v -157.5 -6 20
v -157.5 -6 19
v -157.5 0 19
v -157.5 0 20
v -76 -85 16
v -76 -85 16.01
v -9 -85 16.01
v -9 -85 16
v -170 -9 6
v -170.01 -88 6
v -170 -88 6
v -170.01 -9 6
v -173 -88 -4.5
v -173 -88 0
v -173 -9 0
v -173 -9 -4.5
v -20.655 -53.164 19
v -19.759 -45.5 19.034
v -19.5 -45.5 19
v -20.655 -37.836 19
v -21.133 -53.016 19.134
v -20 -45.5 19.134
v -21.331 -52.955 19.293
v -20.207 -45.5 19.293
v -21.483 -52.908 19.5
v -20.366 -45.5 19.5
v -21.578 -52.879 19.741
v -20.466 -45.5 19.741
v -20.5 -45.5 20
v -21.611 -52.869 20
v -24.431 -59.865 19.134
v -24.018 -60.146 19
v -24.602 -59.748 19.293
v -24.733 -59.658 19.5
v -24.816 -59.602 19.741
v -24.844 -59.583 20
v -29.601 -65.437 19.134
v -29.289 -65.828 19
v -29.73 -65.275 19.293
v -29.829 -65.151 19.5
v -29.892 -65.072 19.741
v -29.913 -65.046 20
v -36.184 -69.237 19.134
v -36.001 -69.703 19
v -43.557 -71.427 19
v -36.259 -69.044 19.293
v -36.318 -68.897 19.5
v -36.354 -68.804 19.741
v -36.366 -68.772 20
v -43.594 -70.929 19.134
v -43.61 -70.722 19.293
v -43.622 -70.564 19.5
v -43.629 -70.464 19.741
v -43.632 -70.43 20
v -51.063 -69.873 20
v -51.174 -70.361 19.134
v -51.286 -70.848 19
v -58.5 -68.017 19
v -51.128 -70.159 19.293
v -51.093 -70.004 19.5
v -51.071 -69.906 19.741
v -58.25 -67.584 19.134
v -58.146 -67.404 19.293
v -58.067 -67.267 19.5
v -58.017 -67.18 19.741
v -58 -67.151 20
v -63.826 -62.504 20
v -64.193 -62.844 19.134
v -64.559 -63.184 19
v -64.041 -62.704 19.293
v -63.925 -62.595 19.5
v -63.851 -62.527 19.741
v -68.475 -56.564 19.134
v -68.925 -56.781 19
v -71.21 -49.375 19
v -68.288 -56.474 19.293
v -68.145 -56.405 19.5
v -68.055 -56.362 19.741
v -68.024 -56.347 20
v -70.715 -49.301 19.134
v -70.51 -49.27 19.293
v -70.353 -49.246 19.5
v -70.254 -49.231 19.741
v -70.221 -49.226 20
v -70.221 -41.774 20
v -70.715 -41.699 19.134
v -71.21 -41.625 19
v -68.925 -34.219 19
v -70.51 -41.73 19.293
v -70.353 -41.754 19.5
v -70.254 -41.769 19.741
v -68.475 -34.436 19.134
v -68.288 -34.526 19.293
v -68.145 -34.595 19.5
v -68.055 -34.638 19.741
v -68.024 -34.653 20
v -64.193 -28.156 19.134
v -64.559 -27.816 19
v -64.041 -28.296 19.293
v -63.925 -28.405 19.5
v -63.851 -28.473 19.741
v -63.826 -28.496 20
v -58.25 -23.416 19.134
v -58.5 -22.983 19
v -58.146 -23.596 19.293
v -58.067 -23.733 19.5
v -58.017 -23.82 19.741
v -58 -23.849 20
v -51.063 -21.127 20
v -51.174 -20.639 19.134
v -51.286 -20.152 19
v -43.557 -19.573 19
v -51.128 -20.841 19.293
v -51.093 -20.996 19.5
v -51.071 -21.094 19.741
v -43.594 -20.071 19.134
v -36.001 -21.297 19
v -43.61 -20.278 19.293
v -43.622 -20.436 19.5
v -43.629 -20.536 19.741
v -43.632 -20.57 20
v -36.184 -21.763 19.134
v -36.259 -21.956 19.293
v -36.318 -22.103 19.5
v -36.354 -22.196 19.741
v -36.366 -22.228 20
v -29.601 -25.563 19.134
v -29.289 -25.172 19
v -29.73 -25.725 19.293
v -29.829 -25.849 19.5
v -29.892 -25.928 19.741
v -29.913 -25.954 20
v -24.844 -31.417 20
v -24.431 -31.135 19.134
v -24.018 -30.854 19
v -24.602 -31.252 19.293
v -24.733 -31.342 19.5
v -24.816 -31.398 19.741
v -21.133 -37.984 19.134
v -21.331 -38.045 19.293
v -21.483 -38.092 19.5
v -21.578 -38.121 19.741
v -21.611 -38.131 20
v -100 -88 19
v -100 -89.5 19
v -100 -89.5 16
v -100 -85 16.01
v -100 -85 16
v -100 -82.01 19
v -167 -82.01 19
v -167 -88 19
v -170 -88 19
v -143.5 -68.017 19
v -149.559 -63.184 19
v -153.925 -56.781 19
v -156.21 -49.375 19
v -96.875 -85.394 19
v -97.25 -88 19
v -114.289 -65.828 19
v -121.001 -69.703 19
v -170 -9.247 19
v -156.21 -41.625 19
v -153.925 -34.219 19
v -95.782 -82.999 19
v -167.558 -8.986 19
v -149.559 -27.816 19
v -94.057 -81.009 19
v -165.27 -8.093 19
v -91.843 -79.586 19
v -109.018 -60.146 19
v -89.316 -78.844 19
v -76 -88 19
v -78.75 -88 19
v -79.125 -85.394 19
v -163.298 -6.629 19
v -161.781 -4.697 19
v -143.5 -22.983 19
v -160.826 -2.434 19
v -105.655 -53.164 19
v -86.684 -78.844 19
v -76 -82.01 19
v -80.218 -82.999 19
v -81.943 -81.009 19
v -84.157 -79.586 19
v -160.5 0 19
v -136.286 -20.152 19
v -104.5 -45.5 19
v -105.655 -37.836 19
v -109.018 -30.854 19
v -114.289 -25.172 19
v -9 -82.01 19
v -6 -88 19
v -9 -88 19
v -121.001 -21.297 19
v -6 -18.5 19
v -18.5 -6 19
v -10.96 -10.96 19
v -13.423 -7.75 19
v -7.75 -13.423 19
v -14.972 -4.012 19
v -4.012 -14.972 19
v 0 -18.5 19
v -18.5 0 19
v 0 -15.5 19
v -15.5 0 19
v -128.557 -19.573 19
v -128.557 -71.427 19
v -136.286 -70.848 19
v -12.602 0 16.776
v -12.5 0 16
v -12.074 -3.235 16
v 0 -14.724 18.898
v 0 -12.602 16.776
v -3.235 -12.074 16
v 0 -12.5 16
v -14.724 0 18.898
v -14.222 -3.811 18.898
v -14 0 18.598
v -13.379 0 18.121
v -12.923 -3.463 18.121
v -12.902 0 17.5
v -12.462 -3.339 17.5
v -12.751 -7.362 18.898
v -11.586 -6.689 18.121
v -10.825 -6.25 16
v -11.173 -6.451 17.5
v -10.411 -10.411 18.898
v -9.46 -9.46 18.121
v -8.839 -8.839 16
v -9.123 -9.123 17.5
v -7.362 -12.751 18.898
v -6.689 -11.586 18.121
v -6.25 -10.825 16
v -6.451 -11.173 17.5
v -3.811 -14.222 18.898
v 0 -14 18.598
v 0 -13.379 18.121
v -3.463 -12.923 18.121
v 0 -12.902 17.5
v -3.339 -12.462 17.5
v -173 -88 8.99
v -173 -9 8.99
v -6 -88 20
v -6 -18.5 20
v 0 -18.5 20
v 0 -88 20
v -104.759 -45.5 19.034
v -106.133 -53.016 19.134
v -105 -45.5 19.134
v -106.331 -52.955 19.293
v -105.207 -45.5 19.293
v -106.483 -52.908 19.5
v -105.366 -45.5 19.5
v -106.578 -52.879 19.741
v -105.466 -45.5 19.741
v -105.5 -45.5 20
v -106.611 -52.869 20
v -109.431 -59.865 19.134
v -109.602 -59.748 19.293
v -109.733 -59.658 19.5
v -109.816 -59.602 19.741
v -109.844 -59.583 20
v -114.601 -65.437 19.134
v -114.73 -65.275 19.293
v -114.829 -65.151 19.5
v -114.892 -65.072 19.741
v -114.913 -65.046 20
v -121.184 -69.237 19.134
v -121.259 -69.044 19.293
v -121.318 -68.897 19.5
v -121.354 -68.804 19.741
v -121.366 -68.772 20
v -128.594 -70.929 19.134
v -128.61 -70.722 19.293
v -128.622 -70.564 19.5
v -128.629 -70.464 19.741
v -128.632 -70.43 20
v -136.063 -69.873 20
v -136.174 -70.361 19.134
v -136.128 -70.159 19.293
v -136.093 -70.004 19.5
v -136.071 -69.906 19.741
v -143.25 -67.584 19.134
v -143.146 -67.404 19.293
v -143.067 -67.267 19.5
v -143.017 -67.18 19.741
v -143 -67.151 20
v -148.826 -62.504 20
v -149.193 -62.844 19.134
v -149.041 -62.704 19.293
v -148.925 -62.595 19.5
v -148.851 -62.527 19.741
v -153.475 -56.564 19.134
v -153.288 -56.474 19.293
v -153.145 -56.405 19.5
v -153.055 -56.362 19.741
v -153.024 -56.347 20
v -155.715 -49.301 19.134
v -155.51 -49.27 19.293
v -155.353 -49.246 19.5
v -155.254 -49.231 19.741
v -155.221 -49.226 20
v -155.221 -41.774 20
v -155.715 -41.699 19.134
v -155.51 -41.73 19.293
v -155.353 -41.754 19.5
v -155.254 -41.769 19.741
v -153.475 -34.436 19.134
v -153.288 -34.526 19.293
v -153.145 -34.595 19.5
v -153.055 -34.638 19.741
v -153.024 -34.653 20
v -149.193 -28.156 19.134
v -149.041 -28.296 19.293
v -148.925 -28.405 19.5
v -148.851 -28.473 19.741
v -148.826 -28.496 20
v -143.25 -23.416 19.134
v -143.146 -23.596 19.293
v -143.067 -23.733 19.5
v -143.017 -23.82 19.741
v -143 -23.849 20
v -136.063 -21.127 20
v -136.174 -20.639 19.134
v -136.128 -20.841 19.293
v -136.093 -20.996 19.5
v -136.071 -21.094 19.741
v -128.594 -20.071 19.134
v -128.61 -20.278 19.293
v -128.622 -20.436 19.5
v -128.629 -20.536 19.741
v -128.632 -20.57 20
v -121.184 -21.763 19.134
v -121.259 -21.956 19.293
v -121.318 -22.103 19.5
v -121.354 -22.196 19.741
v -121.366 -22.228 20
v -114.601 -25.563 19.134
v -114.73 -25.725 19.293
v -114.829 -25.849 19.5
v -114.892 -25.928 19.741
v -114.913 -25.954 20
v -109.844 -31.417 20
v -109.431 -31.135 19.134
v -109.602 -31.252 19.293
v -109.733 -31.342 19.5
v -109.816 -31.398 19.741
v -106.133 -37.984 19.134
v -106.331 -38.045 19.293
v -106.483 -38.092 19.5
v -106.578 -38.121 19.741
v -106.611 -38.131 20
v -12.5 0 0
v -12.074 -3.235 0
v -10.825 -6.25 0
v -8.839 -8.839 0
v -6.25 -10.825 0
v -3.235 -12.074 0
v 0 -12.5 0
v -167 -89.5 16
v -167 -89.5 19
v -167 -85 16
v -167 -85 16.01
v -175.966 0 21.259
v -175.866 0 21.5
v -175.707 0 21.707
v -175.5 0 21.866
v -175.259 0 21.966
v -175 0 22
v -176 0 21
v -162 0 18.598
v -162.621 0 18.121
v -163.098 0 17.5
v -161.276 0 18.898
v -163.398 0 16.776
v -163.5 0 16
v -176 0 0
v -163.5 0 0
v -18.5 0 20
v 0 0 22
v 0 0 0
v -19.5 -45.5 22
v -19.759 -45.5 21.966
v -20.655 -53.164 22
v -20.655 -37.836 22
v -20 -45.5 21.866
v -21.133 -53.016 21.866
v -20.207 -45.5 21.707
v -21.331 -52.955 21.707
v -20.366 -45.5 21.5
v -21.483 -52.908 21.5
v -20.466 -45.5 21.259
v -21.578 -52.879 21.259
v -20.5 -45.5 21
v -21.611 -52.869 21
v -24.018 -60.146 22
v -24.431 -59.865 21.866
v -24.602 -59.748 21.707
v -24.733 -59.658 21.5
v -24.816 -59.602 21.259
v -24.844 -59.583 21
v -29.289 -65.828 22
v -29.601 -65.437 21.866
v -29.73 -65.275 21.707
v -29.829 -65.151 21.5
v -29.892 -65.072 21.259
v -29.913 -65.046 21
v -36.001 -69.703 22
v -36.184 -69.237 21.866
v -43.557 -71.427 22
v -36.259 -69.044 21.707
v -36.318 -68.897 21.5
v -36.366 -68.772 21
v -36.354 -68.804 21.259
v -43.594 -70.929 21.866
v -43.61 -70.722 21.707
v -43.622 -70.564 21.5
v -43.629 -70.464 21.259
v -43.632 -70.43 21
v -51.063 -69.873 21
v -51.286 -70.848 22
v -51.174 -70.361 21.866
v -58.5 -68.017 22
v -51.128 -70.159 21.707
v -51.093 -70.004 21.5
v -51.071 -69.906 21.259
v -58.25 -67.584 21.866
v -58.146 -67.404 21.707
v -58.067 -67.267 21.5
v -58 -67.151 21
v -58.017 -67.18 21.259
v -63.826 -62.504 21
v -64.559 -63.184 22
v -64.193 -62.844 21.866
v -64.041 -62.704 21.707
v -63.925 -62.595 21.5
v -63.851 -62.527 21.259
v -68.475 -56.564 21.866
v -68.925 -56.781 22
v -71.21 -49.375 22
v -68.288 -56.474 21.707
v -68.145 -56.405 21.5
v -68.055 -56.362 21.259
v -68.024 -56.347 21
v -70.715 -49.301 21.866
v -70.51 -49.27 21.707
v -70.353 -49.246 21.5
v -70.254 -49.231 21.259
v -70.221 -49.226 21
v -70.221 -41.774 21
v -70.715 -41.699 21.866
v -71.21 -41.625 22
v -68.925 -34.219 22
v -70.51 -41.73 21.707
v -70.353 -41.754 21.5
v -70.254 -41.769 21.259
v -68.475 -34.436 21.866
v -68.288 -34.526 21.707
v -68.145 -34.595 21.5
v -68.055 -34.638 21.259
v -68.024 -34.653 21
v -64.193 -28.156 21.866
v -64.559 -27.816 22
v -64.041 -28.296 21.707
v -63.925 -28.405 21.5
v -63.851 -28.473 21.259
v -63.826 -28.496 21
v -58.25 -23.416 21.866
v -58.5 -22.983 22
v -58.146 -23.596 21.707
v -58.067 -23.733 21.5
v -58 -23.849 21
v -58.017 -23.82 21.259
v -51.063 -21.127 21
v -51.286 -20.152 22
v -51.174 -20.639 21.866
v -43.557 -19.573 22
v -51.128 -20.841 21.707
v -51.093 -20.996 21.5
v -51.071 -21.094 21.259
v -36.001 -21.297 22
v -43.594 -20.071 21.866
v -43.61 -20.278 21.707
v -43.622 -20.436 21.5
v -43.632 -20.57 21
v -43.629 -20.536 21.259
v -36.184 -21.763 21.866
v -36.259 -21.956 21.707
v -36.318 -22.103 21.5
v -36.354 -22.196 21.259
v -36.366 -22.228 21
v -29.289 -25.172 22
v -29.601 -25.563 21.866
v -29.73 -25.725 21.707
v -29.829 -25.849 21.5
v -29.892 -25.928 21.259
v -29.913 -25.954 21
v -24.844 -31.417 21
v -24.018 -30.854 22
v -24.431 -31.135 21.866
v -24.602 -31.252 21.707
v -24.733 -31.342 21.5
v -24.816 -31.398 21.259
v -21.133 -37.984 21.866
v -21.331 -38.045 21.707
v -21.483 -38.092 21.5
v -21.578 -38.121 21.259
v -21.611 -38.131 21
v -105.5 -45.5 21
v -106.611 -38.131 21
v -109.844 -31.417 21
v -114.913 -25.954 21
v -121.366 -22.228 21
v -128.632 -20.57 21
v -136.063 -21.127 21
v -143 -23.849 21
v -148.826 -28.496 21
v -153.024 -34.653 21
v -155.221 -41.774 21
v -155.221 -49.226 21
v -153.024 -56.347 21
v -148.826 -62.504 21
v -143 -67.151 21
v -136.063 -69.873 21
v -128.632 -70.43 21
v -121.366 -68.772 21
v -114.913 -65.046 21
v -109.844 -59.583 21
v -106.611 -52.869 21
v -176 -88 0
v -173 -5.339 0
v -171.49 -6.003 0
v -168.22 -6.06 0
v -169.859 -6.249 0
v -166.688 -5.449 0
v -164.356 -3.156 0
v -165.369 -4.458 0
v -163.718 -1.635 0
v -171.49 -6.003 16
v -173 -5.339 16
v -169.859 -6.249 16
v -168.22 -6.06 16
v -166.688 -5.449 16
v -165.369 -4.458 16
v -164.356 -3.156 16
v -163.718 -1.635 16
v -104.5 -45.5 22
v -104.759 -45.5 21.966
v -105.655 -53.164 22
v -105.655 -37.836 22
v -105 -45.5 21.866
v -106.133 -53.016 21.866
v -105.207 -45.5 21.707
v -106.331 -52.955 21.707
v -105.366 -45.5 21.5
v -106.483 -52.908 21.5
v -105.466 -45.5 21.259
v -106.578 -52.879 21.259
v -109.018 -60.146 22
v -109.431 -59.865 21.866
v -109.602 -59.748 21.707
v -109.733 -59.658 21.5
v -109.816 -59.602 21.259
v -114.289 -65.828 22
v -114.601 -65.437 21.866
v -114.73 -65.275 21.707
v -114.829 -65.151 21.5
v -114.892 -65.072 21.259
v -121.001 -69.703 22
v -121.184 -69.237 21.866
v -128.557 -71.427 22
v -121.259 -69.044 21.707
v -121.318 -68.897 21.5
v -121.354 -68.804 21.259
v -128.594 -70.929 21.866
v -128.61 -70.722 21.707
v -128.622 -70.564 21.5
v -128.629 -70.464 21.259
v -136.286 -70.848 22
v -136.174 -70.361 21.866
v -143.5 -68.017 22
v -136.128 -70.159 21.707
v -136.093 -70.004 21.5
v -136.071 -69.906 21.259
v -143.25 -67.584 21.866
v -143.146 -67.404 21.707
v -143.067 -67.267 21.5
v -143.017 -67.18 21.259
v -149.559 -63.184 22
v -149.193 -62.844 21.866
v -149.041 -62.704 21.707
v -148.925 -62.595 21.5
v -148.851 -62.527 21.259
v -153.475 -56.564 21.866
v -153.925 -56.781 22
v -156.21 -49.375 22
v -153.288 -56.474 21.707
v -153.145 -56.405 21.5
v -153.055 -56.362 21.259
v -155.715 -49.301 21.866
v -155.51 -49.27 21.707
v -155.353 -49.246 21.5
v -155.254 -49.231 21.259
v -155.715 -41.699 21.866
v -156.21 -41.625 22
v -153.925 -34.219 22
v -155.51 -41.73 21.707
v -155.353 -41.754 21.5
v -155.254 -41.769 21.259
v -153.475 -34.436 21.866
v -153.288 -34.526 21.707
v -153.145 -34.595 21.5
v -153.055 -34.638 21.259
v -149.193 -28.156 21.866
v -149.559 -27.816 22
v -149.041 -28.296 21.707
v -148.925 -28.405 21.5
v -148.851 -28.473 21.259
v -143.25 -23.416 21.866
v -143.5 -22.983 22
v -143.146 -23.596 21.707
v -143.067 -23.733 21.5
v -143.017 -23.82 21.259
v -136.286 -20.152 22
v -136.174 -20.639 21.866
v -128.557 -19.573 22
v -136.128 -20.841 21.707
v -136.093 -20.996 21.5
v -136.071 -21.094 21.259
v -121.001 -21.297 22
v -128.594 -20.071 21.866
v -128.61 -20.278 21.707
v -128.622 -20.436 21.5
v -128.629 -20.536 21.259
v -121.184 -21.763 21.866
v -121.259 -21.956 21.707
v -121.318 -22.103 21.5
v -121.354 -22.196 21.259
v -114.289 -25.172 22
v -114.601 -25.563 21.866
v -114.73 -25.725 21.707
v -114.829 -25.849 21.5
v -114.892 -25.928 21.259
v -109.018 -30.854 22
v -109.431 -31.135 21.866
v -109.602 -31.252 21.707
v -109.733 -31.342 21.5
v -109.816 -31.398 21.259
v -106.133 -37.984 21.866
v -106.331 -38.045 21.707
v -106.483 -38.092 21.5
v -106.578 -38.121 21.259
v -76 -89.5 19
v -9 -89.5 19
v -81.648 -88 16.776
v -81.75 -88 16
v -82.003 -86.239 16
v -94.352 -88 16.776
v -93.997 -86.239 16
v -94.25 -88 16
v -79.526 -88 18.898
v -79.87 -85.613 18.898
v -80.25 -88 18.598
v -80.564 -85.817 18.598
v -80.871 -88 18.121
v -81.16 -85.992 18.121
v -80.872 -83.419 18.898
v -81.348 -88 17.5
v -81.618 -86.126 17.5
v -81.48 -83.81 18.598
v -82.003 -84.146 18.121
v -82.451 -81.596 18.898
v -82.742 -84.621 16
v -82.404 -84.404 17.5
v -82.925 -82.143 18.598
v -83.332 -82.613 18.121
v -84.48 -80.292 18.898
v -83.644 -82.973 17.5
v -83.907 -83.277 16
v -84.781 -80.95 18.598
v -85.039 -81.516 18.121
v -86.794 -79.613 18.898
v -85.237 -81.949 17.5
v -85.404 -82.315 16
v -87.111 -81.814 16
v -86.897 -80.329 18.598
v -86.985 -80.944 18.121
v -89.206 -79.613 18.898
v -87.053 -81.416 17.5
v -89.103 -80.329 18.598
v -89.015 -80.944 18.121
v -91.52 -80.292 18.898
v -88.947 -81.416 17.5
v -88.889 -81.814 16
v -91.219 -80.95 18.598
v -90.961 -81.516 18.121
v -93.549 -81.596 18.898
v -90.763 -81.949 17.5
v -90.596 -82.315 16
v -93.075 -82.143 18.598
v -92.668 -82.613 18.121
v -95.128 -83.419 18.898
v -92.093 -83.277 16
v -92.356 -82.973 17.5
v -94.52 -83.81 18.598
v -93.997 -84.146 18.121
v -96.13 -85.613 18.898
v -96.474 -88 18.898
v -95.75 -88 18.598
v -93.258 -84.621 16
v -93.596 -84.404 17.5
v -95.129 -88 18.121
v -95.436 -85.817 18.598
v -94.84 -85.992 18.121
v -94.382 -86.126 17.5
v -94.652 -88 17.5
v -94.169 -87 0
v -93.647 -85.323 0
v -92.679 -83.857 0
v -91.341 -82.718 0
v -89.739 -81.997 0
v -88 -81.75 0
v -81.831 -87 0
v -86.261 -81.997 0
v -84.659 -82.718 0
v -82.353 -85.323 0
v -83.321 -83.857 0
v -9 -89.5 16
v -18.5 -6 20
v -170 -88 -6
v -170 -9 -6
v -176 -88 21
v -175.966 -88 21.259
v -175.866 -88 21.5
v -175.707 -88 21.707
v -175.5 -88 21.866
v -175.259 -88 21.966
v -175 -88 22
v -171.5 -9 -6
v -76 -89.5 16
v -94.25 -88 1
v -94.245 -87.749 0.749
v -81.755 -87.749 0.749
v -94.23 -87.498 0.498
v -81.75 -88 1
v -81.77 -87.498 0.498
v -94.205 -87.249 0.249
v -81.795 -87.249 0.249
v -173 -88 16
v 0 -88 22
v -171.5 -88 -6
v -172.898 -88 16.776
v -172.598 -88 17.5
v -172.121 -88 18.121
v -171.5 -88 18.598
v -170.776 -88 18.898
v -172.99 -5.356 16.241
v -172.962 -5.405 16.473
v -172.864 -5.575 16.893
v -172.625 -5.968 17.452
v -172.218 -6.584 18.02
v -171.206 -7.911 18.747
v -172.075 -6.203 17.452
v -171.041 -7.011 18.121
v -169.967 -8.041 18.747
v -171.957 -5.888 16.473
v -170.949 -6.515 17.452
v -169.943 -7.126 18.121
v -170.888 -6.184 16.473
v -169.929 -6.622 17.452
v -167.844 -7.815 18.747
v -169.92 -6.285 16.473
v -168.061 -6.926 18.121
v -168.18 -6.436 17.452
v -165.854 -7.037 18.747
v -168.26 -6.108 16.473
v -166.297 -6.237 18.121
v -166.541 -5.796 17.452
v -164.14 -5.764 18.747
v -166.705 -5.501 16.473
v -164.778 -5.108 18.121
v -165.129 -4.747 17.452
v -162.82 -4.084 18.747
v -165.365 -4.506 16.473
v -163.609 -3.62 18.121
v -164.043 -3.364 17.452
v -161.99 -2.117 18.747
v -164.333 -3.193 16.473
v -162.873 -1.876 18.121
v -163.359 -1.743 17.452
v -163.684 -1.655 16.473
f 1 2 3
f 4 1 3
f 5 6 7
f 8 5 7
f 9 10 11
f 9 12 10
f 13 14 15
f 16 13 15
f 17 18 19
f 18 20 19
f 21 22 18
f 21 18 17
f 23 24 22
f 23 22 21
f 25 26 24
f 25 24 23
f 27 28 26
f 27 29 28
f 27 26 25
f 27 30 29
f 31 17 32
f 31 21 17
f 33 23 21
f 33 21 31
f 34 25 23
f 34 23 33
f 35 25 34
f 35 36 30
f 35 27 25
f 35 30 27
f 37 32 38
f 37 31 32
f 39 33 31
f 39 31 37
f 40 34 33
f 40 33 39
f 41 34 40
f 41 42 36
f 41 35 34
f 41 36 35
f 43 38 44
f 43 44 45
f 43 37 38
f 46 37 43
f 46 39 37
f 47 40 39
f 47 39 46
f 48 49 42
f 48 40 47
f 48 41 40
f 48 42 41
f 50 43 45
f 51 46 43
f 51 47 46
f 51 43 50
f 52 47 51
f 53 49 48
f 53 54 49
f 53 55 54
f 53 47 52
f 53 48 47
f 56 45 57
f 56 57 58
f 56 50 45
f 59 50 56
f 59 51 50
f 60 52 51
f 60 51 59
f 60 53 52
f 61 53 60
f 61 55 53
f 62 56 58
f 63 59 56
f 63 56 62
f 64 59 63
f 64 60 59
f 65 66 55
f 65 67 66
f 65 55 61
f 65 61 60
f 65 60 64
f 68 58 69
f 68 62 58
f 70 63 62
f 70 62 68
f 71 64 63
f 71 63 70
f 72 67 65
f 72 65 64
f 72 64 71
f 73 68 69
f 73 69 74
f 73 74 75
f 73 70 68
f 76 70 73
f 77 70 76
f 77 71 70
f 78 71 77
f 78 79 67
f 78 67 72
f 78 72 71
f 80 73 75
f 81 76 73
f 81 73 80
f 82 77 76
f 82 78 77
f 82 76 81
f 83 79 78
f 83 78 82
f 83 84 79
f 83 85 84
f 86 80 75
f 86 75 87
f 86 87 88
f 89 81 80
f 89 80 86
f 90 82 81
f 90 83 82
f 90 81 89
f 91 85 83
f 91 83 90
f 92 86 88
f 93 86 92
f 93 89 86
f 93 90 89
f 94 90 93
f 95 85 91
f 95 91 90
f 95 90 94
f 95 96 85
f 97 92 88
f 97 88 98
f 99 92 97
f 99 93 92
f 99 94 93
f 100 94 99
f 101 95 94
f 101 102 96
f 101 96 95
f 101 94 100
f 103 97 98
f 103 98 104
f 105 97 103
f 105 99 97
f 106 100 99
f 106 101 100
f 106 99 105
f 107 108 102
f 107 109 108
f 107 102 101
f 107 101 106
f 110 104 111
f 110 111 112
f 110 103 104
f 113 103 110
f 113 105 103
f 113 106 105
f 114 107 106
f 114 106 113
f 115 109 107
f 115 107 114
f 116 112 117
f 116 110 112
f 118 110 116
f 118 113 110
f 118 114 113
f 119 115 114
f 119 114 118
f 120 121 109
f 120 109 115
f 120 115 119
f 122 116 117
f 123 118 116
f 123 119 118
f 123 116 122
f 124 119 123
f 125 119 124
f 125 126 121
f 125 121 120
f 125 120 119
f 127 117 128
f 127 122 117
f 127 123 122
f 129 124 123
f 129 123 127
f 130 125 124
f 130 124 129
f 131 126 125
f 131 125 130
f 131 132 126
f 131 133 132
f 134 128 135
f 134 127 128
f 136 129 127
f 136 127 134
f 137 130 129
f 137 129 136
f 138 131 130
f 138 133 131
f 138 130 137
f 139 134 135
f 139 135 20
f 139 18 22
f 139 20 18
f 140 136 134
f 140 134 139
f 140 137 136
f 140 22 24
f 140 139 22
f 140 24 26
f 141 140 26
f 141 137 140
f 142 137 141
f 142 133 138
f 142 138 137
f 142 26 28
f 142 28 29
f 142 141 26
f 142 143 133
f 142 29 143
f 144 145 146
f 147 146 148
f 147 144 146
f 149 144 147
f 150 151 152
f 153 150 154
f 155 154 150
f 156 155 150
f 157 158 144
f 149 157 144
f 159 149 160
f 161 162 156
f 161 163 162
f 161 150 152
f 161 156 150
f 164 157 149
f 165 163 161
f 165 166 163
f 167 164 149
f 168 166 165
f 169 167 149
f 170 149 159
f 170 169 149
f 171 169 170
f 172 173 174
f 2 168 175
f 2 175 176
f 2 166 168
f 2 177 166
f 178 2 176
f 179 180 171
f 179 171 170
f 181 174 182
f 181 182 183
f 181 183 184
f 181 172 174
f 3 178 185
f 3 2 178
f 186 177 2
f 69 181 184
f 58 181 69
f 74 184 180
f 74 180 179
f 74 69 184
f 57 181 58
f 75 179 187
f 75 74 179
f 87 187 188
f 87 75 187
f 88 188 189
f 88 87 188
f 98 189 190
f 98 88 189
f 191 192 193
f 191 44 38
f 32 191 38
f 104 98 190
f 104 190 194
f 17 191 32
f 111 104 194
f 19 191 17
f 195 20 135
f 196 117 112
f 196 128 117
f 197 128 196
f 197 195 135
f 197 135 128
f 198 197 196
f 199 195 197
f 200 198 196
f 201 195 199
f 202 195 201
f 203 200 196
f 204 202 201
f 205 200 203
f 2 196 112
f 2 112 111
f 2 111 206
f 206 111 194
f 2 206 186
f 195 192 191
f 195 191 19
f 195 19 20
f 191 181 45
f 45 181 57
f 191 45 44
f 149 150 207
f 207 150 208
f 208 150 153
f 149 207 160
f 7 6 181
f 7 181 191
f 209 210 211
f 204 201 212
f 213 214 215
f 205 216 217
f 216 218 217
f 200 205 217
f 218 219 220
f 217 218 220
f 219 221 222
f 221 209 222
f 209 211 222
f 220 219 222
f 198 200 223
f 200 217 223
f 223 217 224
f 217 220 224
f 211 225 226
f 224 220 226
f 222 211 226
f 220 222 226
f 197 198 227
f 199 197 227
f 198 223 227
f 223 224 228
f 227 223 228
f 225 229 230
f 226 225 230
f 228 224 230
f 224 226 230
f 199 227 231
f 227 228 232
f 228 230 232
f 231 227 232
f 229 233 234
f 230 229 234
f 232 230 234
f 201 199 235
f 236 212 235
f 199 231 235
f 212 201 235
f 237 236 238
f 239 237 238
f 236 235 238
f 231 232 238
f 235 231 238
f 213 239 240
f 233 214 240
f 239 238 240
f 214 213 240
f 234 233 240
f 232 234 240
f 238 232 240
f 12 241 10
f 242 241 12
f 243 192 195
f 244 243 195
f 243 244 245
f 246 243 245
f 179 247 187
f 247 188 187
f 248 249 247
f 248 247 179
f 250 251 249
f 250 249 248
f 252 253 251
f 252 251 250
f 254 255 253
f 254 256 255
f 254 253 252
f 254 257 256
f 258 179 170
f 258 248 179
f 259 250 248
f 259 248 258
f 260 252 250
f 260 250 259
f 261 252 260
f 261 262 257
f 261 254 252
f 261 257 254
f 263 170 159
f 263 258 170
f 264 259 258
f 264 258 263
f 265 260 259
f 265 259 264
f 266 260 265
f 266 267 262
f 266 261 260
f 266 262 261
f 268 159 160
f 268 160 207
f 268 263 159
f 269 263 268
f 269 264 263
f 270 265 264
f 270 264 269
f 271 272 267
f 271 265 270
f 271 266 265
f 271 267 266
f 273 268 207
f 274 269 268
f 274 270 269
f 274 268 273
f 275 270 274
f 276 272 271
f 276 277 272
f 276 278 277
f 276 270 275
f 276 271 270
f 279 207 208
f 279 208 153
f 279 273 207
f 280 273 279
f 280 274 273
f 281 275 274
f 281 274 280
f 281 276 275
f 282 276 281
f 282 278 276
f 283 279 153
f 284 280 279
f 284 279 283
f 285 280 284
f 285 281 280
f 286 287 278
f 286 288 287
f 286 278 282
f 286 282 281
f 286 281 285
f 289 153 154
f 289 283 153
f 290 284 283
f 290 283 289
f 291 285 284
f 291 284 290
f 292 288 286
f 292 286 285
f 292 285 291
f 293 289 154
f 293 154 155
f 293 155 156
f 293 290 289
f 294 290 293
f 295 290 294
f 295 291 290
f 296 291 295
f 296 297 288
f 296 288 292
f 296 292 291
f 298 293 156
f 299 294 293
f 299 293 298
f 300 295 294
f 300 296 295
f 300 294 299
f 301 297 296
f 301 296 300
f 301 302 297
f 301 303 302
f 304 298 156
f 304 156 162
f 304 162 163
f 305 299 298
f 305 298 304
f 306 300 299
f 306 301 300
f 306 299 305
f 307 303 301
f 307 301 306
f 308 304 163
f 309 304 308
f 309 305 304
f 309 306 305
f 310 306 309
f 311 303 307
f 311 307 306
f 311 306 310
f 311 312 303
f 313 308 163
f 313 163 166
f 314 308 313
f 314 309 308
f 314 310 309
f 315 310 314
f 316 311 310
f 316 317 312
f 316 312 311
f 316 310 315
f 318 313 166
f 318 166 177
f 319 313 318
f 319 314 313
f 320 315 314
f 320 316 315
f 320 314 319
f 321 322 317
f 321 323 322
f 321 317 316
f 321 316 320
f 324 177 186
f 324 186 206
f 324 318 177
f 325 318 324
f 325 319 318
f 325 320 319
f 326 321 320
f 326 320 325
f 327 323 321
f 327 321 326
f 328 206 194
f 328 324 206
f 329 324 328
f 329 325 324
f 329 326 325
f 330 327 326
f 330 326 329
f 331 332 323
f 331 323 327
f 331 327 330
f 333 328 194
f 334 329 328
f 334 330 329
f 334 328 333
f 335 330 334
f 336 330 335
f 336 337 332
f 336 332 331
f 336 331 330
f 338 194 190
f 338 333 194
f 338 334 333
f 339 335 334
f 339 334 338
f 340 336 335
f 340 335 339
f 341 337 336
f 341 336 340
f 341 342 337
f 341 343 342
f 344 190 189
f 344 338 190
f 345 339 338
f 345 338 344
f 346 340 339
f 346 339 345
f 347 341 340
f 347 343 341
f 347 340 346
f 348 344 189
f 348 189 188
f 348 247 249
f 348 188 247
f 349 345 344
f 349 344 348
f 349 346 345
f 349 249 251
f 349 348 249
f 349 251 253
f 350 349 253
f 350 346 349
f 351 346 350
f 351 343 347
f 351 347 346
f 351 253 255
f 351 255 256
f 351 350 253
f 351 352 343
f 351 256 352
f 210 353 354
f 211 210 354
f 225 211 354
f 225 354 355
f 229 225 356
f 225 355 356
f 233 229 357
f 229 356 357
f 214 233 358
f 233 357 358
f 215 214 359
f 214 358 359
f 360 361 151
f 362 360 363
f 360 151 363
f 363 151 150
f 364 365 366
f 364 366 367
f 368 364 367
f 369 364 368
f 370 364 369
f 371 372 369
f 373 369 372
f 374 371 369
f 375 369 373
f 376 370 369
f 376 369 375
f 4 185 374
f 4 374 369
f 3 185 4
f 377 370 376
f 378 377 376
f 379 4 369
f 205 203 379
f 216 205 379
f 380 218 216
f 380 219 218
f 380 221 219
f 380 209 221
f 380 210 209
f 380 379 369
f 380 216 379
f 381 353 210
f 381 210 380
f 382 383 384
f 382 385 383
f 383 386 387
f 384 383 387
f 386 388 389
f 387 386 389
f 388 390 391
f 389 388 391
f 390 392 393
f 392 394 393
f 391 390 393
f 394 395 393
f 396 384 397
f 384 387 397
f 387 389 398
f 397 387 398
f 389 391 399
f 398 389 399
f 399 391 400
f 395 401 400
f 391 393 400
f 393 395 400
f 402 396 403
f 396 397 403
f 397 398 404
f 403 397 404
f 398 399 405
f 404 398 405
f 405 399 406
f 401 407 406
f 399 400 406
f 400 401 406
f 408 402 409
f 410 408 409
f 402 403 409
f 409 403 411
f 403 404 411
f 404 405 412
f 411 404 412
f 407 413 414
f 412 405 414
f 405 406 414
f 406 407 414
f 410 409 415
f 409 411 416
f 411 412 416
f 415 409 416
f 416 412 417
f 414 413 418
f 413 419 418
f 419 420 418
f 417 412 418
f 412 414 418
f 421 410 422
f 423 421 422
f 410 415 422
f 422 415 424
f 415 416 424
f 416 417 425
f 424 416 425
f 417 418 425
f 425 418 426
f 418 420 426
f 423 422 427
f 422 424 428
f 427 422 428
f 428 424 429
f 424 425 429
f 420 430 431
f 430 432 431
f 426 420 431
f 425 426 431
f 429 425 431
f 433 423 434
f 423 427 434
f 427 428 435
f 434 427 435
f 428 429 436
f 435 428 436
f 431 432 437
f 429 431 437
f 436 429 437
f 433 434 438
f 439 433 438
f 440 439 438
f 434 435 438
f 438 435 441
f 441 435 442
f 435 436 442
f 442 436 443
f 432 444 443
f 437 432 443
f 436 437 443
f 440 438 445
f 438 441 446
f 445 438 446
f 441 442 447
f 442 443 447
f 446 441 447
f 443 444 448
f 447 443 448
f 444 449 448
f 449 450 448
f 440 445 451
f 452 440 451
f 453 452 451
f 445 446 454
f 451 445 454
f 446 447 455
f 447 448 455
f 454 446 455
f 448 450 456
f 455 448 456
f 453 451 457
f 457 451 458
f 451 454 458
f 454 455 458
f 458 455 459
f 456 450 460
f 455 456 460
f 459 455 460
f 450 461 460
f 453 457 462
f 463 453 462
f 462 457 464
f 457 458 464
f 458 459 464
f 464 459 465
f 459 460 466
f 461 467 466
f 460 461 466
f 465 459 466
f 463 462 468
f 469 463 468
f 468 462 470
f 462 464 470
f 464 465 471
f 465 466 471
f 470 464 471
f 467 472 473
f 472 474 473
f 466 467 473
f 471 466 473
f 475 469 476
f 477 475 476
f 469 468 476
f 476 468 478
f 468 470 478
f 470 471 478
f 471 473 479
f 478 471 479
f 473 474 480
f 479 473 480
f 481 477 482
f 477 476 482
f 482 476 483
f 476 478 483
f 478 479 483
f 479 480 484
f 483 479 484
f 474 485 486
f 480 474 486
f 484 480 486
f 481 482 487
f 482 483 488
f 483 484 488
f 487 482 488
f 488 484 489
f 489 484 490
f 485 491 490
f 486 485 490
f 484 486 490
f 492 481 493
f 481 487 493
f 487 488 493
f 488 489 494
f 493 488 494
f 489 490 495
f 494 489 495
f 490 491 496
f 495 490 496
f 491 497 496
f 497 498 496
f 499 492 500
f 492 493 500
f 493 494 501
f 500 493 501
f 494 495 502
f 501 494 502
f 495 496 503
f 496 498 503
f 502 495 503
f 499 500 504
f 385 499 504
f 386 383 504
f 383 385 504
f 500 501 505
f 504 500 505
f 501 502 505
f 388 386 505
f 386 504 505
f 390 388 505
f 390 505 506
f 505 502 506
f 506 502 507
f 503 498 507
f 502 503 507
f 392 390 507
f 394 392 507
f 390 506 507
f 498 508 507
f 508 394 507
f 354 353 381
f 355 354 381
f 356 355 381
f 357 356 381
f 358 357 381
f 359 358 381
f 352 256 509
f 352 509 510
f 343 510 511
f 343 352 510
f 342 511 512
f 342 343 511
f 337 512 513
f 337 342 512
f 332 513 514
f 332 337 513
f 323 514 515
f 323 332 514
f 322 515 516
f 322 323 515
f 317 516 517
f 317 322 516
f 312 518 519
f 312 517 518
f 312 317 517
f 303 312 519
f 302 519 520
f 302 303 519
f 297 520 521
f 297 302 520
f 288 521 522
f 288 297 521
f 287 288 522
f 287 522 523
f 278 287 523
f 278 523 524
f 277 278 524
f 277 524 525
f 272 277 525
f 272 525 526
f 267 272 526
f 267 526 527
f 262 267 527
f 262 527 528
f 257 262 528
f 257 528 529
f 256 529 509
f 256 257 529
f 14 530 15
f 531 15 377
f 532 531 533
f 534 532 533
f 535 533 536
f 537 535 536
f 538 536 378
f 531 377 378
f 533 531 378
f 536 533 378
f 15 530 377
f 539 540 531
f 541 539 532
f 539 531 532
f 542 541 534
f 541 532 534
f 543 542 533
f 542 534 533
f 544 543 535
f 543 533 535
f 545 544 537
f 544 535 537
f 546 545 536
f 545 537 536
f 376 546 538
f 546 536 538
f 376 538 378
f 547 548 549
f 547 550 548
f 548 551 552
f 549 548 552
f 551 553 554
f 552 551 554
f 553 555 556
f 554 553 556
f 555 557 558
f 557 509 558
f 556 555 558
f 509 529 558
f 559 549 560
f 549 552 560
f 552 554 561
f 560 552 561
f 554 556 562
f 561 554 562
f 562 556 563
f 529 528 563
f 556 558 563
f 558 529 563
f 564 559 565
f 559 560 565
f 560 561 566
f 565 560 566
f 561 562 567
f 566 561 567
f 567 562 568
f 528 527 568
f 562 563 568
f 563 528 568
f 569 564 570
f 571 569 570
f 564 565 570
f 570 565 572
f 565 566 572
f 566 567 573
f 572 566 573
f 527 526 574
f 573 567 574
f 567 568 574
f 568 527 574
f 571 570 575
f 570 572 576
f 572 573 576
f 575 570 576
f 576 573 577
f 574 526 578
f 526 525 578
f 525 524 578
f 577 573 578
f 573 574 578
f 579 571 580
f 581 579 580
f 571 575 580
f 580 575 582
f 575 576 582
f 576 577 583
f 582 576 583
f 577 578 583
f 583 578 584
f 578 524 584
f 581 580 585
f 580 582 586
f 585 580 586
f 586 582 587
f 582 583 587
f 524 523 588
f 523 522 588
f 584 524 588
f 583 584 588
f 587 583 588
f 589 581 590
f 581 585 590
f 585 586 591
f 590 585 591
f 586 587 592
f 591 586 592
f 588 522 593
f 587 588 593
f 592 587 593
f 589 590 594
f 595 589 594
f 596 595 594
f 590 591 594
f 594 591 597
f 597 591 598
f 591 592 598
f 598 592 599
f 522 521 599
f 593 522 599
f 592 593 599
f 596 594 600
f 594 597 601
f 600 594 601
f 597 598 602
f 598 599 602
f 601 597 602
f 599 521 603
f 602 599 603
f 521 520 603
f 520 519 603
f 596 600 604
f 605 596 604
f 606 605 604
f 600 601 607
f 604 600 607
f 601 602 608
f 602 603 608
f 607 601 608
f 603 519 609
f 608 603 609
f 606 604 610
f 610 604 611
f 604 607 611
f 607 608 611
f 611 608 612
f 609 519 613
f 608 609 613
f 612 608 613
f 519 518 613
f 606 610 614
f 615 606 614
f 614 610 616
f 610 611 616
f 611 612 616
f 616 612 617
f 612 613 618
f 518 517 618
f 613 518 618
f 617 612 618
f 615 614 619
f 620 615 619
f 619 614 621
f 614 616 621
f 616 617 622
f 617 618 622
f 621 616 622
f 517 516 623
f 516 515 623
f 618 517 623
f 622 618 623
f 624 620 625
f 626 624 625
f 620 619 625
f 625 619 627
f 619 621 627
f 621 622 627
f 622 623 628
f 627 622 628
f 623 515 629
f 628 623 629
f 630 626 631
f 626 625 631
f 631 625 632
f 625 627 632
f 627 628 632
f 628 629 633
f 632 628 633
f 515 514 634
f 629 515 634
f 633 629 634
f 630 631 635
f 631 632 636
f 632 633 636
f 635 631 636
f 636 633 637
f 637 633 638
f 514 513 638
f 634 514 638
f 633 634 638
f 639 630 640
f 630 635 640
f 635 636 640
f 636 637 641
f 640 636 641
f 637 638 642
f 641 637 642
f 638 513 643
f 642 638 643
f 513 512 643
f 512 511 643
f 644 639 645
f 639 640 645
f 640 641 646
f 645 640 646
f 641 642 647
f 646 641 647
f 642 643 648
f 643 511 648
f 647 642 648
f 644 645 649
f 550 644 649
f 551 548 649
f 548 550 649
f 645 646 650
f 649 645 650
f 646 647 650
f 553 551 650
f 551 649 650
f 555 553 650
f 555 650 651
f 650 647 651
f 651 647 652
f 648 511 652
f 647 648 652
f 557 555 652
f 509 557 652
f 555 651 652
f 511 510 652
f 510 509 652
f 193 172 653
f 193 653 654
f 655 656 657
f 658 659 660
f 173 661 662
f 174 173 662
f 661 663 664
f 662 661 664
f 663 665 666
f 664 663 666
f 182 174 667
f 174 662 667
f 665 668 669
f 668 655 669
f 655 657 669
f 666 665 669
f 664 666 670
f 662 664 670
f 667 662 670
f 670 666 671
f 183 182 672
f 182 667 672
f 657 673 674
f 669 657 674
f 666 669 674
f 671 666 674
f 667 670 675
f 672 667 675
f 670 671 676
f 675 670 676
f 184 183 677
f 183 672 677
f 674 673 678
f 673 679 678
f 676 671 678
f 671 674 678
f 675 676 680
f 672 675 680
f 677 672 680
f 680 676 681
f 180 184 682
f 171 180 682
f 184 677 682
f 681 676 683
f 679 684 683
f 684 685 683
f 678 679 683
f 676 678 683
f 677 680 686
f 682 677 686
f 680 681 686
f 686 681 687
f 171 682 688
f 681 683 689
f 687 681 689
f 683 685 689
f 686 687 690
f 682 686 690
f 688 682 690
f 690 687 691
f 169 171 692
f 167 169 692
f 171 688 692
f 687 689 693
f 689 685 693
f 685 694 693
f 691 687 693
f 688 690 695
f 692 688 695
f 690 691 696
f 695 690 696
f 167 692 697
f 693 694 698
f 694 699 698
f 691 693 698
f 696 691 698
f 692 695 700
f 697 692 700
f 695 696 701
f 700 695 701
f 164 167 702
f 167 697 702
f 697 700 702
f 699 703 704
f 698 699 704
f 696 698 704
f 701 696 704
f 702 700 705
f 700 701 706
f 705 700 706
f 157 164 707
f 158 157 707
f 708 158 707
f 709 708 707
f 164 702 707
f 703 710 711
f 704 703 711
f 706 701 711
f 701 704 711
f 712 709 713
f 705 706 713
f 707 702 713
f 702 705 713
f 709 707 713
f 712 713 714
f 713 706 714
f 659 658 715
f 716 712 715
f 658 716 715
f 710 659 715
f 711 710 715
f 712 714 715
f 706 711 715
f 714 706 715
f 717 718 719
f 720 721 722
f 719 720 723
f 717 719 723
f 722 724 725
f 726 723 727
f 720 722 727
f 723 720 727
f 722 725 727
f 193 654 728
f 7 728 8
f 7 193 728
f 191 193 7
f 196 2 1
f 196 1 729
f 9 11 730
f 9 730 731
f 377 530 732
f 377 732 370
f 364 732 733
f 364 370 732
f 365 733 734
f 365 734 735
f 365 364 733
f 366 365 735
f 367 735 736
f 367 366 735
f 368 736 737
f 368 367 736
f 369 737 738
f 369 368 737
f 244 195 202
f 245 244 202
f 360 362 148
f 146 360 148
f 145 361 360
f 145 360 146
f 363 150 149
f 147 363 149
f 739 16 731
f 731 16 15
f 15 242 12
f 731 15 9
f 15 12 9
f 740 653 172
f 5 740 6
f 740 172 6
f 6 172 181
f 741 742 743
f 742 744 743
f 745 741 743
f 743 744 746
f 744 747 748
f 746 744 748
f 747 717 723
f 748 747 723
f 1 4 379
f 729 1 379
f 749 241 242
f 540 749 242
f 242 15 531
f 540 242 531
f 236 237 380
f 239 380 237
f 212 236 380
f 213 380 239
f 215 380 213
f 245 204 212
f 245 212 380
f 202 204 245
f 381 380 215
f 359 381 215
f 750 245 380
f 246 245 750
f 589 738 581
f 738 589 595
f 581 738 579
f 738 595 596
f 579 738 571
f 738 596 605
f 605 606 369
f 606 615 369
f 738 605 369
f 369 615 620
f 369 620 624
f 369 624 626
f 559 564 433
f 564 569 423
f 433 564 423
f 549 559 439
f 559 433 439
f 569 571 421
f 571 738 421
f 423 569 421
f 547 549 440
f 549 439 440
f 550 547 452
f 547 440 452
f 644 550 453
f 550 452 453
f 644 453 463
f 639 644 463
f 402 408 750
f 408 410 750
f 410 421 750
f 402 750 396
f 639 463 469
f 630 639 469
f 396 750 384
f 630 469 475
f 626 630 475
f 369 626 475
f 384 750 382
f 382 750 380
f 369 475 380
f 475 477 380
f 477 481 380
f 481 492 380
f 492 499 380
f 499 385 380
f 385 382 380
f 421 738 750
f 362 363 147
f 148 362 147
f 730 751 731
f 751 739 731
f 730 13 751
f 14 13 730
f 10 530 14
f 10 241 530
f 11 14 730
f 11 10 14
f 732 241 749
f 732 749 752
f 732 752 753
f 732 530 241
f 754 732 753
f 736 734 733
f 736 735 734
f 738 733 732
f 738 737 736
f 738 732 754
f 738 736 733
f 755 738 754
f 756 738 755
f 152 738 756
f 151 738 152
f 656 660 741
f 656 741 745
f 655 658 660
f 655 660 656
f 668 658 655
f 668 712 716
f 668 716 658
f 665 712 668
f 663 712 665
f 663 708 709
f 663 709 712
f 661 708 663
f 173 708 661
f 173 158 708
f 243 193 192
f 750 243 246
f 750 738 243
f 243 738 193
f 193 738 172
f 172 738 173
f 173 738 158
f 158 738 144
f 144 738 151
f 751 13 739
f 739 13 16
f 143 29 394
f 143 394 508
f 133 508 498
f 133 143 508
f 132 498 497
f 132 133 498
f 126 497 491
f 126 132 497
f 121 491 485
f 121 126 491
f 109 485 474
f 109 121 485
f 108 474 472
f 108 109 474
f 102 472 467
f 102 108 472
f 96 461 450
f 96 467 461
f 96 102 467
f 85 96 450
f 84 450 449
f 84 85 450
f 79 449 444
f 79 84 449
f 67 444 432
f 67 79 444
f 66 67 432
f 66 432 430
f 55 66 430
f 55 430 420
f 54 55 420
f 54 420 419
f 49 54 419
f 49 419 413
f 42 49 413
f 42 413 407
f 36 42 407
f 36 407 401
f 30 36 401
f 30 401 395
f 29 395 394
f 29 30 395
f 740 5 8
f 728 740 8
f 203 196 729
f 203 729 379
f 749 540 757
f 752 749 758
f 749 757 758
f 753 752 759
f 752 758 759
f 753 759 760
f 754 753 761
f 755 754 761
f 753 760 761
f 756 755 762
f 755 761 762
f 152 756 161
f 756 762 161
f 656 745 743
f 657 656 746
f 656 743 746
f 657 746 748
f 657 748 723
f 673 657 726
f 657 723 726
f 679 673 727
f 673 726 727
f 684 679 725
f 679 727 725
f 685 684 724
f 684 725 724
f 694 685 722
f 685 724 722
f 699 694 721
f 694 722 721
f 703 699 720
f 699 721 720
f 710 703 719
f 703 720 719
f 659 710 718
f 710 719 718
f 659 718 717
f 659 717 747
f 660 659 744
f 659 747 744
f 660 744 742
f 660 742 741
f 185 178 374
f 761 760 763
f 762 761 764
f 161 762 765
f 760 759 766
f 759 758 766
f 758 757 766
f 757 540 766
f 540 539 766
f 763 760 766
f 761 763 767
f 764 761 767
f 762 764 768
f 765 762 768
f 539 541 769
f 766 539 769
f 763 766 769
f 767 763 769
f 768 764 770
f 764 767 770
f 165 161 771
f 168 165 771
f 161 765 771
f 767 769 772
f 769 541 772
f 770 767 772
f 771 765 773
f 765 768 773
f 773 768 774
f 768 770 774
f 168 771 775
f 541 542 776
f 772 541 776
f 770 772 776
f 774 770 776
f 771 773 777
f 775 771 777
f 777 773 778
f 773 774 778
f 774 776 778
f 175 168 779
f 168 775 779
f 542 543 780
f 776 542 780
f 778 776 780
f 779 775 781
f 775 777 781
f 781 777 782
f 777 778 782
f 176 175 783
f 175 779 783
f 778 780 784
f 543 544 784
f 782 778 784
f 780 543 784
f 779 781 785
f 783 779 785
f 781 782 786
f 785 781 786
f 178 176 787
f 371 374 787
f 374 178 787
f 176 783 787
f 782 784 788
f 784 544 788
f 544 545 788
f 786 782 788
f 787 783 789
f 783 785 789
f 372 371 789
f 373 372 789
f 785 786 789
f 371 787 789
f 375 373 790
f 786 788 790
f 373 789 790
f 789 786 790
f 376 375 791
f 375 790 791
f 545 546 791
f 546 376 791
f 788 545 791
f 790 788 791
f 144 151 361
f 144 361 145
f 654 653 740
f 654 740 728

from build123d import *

# Parameters (mm, degrees)
SKETCH028_W          = 88
SKETCH028_H          = 3
PAD012_DEPTH         = 176
SKETCH029_R          = 25
POCKET015_DEPTH      = 100
POCKET015_DEPTH_BACK = 100
PAD014_DEPTH         = 19
SKETCH032_W          = 139
SKETCH032_H          = 6
SKETCH032_W_2        = 6
SKETCH032_H_2        = 69.5
POCKET016_DEPTH      = 20
SKETCH043_W          = 3
SKETCH043_H          = 88
PAD019_DEPTH         = 19
SKETCH044_W          = 3
SKETCH044_H          = 79
PAD020_DEPTH         = 6
PAD020_DEPTH_BACK    = 6
CHAMFER007_SIZE      = 2.99
CHAMFER008_SIZE      = 1.5
FILLET012_R          = 3
FILLET013_R          = 1
SKETCH086_W          = 67
SKETCH086_H          = 4.5
PAD037_DEPTH         = 3
CHAMFER011_SIZE      = 2.99
CHAMFER013_SIZE      = 1


with BuildPart() as part:
    # Sketch028 → Pad012 (new body)
    with BuildSketch(Plane.YZ):
        with Locations((-44, 20.5)):
            Rectangle(SKETCH028_W, SKETCH028_H)
    extrude(amount=-PAD012_DEPTH)

    # Sketch029 → Pocket015 (cut, two sides)
    with BuildSketch(Plane.XY) as pocket015_sk:
        with Locations((-130.5, -45.5)):
            Circle(SKETCH029_R)
        with Locations((-45.5, -45.5)):
            Circle(SKETCH029_R)
    extrude(amount=-POCKET015_DEPTH, mode=Mode.SUBTRACT)
    extrude(pocket015_sk.sketch, amount=POCKET015_DEPTH_BACK, mode=Mode.SUBTRACT)

    # Sketch031 → Pad014 (join)
    with BuildSketch(Plane.XY):
        with BuildLine():
            ThreePointArc((-12.5, 0), (-8.838835, -8.838835), (0, -12.5))
            Line((0, 0), (0, -12.5))
            Line((-12.5, 0), (0, 0))
        make_face()
        with BuildLine():
            ThreePointArc((-176, 0), (-169.75, -6.25), (-163.5, 0))
            Line((-176, 0), (-163.5, 0))
        make_face()
        with BuildLine():
            ThreePointArc((-81.75, -88), (-88, -81.75), (-94.25, -88))
            Line((-94.25, -88), (-81.75, -88))
        make_face()
    extrude(amount=PAD014_DEPTH)

    # Sketch032 → Pocket016 (cut)
    with BuildSketch(Plane.XY):
        with Locations((-88, -3)):
            Rectangle(SKETCH032_W, SKETCH032_H)
        with Locations((-3, -53.25)):
            Rectangle(SKETCH032_W_2, SKETCH032_H_2)
    extrude(amount=POCKET016_DEPTH, mode=Mode.SUBTRACT)

    # Sketch043 → Pad019 (join)
    with BuildSketch(Plane.XY):
        with Locations((-174.5, -44)):
            Rectangle(SKETCH043_W, SKETCH043_H)
    extrude(amount=PAD019_DEPTH)

    # Sketch044 → Pad020 (join, two sides)
    with BuildSketch(Plane.XY) as pad020_sk:
        with Locations((-171.5, -48.5)):
            Rectangle(SKETCH044_W, SKETCH044_H)
    extrude(amount=PAD020_DEPTH)
    extrude(pad020_sk.sketch, amount=-PAD020_DEPTH_BACK)

    # Chamfer007
    chamfer007_edges = [part.edges().sort_by_distance(p)[0] for p in [
        (-173, -48.5, 6),
    ]]
    chamfer(chamfer007_edges, length=CHAMFER007_SIZE)

    # Chamfer008
    chamfer008_edges = [part.edges().sort_by_distance(p)[0] for p in [
        (-173, -48.5, -6),
    ]]
    chamfer(chamfer008_edges, length=CHAMFER008_SIZE)

    # Fillet012
    fillet012_edges = [part.edges().sort_by_distance(p)[0] for p in [
        (-166.688138, -5.448624, 19),
        (-88, -81.75, 19),
        (-8.838835, -8.838835, 19),
        (-173, -46.66927, 19),
    ]]
    fillet(fillet012_edges, radius=FILLET012_R)

    # Fillet013
    fillet013_edges = [part.edges().sort_by_distance(p)[0] for p in [
        (-155.5, -45.5, 22),
        (-105.5, -45.5, 20.5),
        (-155.5, -45.5, 19),
        (-70.5, -45.5, 22),
        (-20.5, -45.5, 20.5),
        (-70.5, -45.5, 19),
        (-176, -44, 22),
    ]]
    fillet(fillet013_edges, radius=FILLET013_R)

    # Sketch086 → Pad037 (join)
    with BuildSketch(Plane.XY.offset(19)):
        with Locations((-133.5, -87.25)):
            Rectangle(SKETCH086_W, SKETCH086_H)
        with Locations((-42.5, -87.25)):
            Rectangle(SKETCH086_W, SKETCH086_H)
    extrude(amount=-PAD037_DEPTH)

    # Chamfer011
    chamfer011_edges = [part.edges().sort_by_distance(p)[0] for p in [
        (-133.5, -85, 19),
        (-42.5, -85, 19),
    ]]
    chamfer(chamfer011_edges, length=CHAMFER011_SIZE)

    # Chamfer013
    chamfer013_edges = [part.edges().sort_by_distance(p)[0] for p in [
        (-88, -88, 0),
    ]]
    chamfer(chamfer013_edges, length=CHAMFER013_SIZE)


solid = part.part
